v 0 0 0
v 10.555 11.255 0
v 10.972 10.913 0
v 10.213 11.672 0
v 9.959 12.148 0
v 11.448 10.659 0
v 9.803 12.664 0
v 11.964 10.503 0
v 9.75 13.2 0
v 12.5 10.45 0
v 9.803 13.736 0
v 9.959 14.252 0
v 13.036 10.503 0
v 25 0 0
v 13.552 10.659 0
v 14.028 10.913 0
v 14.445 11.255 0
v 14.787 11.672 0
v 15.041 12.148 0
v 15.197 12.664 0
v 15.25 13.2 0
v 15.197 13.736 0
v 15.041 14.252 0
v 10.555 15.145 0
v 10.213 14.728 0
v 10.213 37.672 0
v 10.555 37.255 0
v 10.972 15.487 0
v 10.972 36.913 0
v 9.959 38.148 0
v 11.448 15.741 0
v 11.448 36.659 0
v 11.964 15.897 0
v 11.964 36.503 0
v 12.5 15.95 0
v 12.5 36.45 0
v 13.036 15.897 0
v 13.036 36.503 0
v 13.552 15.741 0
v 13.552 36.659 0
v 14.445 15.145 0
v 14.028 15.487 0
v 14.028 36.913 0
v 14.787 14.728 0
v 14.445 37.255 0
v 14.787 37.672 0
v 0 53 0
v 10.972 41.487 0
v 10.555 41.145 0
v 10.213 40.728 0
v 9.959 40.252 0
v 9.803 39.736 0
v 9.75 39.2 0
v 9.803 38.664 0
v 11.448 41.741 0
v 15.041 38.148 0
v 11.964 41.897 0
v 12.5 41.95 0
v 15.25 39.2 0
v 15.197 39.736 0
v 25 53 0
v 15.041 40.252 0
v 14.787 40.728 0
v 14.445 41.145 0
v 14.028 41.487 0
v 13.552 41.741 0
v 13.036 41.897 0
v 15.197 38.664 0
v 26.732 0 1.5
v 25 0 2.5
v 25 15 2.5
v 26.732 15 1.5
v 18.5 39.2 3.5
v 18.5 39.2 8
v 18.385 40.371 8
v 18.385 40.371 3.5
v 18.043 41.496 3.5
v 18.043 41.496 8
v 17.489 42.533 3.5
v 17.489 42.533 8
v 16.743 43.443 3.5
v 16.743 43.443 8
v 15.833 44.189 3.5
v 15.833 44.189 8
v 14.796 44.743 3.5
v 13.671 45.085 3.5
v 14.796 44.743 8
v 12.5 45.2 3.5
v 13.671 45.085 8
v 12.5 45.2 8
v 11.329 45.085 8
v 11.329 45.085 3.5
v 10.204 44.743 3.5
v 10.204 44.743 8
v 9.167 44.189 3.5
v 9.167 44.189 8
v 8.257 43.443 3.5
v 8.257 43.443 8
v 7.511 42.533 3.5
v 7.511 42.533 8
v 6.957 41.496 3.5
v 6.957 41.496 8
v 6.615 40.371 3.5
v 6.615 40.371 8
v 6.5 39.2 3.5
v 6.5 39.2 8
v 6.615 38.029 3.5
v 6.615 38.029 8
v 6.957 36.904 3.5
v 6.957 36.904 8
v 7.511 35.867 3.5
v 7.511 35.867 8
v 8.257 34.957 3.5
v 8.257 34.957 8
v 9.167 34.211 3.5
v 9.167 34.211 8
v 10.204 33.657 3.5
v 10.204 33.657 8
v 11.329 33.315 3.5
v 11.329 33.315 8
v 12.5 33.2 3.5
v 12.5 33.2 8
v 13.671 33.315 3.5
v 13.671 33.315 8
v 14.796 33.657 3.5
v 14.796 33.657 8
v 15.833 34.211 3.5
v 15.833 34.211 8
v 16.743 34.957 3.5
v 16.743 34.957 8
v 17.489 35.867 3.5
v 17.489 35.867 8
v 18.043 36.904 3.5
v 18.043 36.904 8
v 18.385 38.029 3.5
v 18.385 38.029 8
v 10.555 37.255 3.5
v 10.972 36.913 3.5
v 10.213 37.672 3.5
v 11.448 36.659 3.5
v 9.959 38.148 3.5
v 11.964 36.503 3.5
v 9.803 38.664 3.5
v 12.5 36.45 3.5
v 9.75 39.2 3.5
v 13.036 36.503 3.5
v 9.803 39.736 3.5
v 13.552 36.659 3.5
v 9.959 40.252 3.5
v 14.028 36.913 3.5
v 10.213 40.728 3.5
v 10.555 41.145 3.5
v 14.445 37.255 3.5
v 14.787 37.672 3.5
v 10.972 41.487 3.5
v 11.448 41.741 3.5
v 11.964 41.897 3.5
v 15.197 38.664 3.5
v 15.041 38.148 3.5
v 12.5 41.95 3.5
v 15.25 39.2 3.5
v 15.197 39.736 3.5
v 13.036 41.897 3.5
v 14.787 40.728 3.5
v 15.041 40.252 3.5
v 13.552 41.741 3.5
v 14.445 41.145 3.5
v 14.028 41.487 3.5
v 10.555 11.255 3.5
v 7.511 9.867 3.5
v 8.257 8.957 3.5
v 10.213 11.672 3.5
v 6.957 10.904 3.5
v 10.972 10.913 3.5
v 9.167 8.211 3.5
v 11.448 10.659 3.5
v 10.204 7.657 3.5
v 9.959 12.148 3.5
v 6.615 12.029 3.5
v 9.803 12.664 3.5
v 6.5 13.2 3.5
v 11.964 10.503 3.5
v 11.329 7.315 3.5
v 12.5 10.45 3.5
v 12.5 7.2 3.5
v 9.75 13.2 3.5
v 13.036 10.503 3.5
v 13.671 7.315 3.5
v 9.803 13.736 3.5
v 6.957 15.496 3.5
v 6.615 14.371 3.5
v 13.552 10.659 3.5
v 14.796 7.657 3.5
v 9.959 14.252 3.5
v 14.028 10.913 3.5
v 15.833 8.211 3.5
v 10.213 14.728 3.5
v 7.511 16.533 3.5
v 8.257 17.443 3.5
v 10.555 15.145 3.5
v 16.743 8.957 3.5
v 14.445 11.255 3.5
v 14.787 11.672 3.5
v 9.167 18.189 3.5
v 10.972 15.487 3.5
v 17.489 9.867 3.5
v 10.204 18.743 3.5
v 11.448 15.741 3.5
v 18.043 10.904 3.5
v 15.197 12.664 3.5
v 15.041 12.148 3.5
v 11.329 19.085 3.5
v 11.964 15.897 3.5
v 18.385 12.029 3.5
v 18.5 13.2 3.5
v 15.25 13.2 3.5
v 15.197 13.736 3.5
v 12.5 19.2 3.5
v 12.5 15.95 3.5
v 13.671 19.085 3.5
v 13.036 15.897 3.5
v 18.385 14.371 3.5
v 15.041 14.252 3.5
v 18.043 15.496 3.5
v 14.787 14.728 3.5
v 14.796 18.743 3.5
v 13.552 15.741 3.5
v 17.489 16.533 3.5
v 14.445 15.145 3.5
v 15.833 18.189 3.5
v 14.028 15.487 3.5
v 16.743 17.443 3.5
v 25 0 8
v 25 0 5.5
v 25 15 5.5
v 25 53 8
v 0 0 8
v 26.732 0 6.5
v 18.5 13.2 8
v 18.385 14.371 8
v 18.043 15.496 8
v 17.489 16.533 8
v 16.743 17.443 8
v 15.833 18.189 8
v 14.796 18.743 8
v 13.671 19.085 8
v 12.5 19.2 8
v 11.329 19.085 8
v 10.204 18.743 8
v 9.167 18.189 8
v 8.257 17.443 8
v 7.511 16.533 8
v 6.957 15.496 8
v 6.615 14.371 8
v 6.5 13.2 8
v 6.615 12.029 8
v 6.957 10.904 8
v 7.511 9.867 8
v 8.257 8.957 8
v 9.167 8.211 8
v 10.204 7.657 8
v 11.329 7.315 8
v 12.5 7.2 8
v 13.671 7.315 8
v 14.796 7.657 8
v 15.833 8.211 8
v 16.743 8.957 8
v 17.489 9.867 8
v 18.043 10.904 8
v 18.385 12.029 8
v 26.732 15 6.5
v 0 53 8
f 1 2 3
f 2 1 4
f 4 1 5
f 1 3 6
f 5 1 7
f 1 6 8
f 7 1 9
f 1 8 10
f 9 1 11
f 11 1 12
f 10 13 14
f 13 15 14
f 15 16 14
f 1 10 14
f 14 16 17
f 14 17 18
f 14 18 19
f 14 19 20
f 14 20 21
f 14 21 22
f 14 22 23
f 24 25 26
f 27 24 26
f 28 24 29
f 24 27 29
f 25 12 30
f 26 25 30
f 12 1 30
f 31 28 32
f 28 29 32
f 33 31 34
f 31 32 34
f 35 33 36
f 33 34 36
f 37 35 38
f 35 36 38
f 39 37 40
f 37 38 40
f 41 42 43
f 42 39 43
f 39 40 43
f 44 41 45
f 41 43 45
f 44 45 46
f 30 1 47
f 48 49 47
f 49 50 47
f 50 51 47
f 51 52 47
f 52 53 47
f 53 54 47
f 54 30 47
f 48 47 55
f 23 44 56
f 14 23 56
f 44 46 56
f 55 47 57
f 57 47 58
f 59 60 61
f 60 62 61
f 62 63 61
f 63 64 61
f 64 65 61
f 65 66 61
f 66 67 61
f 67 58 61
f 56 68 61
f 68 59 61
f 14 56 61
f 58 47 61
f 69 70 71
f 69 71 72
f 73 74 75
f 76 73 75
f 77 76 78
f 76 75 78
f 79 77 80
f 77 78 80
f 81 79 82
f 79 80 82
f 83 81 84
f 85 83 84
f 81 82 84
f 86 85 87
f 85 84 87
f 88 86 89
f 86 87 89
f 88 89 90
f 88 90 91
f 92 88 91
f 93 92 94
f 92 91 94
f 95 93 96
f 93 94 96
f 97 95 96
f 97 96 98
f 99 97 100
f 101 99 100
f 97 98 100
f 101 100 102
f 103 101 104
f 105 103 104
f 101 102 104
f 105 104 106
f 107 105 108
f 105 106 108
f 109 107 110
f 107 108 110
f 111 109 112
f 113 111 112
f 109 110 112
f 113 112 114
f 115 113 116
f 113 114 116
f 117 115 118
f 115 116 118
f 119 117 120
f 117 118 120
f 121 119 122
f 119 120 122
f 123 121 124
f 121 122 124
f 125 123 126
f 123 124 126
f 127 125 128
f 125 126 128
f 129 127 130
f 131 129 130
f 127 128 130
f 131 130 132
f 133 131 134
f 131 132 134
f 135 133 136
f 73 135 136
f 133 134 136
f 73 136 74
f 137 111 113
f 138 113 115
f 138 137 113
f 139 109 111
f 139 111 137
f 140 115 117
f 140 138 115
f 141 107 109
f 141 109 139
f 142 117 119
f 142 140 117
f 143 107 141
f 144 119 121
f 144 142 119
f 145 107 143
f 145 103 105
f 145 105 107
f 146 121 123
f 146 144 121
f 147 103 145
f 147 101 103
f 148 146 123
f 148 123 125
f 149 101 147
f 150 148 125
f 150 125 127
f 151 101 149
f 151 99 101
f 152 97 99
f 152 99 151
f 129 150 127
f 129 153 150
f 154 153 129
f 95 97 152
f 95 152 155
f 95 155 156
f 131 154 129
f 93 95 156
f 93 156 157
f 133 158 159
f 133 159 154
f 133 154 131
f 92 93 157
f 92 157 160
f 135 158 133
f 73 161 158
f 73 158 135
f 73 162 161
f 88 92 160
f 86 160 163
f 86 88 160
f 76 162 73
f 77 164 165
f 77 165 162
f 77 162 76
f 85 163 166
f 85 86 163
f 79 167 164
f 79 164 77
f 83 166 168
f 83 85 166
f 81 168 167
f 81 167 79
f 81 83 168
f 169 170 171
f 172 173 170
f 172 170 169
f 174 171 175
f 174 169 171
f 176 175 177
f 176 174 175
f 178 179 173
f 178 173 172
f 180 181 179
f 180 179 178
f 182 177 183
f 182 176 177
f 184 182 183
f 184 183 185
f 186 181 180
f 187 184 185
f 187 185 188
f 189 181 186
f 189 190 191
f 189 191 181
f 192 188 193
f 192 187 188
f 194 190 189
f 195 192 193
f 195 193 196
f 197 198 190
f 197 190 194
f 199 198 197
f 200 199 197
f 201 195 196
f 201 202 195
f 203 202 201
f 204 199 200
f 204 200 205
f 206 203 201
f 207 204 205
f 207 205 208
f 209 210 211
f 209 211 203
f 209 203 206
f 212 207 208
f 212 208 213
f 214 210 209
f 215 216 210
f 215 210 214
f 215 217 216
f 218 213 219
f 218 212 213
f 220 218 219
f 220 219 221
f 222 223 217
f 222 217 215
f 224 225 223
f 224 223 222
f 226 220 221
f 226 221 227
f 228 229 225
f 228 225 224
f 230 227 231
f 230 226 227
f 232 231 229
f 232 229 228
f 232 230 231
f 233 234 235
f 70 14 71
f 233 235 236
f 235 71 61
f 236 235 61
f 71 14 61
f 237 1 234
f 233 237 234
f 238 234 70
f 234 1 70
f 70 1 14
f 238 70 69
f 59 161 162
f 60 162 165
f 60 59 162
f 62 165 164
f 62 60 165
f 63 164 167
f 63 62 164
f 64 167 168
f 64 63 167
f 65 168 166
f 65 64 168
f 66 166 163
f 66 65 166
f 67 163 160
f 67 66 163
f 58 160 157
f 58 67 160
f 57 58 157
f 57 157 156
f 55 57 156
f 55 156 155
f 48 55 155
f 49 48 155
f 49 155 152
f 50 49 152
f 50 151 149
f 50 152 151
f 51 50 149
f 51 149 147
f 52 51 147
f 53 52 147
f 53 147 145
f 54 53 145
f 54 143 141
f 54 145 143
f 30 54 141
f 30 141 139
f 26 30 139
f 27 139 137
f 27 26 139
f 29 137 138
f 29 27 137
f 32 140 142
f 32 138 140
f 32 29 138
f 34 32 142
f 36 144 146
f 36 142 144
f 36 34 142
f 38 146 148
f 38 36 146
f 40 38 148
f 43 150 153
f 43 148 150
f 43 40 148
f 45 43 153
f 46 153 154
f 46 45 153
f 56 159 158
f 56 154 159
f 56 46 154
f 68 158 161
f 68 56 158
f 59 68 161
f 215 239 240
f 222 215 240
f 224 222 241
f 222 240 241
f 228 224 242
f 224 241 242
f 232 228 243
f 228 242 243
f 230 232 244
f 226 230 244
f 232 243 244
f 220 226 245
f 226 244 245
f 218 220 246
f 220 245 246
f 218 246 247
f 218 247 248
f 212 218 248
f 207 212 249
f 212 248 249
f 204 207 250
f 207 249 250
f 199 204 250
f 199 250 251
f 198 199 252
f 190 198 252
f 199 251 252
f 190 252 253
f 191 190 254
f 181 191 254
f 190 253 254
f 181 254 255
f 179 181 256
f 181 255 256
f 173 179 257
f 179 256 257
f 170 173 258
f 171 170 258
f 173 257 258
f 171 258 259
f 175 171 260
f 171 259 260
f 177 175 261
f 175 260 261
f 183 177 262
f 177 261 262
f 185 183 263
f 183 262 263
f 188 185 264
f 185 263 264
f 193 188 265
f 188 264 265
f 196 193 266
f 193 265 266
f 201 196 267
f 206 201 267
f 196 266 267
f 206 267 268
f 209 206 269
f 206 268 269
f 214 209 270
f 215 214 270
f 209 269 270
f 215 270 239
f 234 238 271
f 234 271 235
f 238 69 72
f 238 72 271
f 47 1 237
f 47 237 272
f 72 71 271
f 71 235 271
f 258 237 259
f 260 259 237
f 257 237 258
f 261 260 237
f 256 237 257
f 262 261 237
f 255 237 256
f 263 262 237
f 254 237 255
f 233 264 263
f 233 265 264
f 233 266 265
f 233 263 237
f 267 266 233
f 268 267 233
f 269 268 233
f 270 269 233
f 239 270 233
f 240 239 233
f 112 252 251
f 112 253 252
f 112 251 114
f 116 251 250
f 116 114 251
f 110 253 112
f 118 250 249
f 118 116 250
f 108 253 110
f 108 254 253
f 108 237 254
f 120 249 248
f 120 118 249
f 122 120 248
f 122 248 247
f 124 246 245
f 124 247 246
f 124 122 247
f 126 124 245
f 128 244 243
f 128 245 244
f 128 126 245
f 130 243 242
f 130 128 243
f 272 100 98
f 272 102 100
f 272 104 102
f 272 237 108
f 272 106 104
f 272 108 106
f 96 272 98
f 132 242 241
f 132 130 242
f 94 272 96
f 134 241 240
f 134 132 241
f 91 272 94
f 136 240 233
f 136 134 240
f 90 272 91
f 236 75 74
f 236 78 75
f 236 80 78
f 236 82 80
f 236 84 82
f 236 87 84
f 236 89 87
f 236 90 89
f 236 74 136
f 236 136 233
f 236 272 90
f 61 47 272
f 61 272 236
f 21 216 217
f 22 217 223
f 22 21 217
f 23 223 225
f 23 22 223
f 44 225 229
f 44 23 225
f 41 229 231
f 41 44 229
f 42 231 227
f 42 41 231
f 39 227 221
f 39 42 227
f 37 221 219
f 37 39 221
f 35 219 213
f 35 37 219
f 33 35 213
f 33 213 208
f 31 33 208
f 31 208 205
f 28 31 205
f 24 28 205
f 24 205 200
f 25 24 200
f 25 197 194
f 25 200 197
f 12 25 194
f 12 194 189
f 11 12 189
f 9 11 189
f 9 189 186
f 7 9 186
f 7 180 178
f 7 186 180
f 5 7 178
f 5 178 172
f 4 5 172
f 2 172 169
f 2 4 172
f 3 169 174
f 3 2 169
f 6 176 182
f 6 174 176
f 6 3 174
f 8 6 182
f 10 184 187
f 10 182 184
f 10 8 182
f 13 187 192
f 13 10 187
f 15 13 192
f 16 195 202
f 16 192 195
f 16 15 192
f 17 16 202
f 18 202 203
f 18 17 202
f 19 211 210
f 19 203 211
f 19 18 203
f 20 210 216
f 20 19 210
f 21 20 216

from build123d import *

# Parameters (mm, degrees)
SKETCH2_W           = 25
SKETCH2_H           = 53
SKETCH2_R           = 2.75
BOSS_EXTRUDE1_DEPTH = 8
BOSS_EXTRUDE2_DEPTH = 15
SKETCH4_R           = 6
CUT_EXTRUDE1_DEPTH  = 4.5


with BuildPart() as part:
    # Sketch2 → Boss-Extrude1 (new body)
    with BuildSketch(Plane.XY):
        with Locations((12.5, 26.5)):
            Rectangle(SKETCH2_W, SKETCH2_H)
        with Locations((12.5, 39.2)):
            Circle(SKETCH2_R, mode=Mode.SUBTRACT)
        with Locations((12.5, 13.2)):
            Circle(SKETCH2_R, mode=Mode.SUBTRACT)
    extrude(amount=BOSS_EXTRUDE1_DEPTH)

    # Sketch3 → Boss-Extrude2 (add)
    with BuildSketch(Plane.XZ):
        Polygon((25, 2.5), (26.732050808, 1.5), (26.732050808, 6.5), (25, 5.5), align=None)
    extrude(amount=-BOSS_EXTRUDE2_DEPTH)

    # Sketch4 → Cut-Extrude1 (cut)
    with BuildSketch(Plane.XY.offset(8)):
        with Locations((12.5, 39.2)):
            Circle(SKETCH4_R)
        with Locations((12.5, 13.2)):
            Circle(SKETCH4_R)
    extrude(amount=-CUT_EXTRUDE1_DEPTH, mode=Mode.SUBTRACT)


solid = part.part
